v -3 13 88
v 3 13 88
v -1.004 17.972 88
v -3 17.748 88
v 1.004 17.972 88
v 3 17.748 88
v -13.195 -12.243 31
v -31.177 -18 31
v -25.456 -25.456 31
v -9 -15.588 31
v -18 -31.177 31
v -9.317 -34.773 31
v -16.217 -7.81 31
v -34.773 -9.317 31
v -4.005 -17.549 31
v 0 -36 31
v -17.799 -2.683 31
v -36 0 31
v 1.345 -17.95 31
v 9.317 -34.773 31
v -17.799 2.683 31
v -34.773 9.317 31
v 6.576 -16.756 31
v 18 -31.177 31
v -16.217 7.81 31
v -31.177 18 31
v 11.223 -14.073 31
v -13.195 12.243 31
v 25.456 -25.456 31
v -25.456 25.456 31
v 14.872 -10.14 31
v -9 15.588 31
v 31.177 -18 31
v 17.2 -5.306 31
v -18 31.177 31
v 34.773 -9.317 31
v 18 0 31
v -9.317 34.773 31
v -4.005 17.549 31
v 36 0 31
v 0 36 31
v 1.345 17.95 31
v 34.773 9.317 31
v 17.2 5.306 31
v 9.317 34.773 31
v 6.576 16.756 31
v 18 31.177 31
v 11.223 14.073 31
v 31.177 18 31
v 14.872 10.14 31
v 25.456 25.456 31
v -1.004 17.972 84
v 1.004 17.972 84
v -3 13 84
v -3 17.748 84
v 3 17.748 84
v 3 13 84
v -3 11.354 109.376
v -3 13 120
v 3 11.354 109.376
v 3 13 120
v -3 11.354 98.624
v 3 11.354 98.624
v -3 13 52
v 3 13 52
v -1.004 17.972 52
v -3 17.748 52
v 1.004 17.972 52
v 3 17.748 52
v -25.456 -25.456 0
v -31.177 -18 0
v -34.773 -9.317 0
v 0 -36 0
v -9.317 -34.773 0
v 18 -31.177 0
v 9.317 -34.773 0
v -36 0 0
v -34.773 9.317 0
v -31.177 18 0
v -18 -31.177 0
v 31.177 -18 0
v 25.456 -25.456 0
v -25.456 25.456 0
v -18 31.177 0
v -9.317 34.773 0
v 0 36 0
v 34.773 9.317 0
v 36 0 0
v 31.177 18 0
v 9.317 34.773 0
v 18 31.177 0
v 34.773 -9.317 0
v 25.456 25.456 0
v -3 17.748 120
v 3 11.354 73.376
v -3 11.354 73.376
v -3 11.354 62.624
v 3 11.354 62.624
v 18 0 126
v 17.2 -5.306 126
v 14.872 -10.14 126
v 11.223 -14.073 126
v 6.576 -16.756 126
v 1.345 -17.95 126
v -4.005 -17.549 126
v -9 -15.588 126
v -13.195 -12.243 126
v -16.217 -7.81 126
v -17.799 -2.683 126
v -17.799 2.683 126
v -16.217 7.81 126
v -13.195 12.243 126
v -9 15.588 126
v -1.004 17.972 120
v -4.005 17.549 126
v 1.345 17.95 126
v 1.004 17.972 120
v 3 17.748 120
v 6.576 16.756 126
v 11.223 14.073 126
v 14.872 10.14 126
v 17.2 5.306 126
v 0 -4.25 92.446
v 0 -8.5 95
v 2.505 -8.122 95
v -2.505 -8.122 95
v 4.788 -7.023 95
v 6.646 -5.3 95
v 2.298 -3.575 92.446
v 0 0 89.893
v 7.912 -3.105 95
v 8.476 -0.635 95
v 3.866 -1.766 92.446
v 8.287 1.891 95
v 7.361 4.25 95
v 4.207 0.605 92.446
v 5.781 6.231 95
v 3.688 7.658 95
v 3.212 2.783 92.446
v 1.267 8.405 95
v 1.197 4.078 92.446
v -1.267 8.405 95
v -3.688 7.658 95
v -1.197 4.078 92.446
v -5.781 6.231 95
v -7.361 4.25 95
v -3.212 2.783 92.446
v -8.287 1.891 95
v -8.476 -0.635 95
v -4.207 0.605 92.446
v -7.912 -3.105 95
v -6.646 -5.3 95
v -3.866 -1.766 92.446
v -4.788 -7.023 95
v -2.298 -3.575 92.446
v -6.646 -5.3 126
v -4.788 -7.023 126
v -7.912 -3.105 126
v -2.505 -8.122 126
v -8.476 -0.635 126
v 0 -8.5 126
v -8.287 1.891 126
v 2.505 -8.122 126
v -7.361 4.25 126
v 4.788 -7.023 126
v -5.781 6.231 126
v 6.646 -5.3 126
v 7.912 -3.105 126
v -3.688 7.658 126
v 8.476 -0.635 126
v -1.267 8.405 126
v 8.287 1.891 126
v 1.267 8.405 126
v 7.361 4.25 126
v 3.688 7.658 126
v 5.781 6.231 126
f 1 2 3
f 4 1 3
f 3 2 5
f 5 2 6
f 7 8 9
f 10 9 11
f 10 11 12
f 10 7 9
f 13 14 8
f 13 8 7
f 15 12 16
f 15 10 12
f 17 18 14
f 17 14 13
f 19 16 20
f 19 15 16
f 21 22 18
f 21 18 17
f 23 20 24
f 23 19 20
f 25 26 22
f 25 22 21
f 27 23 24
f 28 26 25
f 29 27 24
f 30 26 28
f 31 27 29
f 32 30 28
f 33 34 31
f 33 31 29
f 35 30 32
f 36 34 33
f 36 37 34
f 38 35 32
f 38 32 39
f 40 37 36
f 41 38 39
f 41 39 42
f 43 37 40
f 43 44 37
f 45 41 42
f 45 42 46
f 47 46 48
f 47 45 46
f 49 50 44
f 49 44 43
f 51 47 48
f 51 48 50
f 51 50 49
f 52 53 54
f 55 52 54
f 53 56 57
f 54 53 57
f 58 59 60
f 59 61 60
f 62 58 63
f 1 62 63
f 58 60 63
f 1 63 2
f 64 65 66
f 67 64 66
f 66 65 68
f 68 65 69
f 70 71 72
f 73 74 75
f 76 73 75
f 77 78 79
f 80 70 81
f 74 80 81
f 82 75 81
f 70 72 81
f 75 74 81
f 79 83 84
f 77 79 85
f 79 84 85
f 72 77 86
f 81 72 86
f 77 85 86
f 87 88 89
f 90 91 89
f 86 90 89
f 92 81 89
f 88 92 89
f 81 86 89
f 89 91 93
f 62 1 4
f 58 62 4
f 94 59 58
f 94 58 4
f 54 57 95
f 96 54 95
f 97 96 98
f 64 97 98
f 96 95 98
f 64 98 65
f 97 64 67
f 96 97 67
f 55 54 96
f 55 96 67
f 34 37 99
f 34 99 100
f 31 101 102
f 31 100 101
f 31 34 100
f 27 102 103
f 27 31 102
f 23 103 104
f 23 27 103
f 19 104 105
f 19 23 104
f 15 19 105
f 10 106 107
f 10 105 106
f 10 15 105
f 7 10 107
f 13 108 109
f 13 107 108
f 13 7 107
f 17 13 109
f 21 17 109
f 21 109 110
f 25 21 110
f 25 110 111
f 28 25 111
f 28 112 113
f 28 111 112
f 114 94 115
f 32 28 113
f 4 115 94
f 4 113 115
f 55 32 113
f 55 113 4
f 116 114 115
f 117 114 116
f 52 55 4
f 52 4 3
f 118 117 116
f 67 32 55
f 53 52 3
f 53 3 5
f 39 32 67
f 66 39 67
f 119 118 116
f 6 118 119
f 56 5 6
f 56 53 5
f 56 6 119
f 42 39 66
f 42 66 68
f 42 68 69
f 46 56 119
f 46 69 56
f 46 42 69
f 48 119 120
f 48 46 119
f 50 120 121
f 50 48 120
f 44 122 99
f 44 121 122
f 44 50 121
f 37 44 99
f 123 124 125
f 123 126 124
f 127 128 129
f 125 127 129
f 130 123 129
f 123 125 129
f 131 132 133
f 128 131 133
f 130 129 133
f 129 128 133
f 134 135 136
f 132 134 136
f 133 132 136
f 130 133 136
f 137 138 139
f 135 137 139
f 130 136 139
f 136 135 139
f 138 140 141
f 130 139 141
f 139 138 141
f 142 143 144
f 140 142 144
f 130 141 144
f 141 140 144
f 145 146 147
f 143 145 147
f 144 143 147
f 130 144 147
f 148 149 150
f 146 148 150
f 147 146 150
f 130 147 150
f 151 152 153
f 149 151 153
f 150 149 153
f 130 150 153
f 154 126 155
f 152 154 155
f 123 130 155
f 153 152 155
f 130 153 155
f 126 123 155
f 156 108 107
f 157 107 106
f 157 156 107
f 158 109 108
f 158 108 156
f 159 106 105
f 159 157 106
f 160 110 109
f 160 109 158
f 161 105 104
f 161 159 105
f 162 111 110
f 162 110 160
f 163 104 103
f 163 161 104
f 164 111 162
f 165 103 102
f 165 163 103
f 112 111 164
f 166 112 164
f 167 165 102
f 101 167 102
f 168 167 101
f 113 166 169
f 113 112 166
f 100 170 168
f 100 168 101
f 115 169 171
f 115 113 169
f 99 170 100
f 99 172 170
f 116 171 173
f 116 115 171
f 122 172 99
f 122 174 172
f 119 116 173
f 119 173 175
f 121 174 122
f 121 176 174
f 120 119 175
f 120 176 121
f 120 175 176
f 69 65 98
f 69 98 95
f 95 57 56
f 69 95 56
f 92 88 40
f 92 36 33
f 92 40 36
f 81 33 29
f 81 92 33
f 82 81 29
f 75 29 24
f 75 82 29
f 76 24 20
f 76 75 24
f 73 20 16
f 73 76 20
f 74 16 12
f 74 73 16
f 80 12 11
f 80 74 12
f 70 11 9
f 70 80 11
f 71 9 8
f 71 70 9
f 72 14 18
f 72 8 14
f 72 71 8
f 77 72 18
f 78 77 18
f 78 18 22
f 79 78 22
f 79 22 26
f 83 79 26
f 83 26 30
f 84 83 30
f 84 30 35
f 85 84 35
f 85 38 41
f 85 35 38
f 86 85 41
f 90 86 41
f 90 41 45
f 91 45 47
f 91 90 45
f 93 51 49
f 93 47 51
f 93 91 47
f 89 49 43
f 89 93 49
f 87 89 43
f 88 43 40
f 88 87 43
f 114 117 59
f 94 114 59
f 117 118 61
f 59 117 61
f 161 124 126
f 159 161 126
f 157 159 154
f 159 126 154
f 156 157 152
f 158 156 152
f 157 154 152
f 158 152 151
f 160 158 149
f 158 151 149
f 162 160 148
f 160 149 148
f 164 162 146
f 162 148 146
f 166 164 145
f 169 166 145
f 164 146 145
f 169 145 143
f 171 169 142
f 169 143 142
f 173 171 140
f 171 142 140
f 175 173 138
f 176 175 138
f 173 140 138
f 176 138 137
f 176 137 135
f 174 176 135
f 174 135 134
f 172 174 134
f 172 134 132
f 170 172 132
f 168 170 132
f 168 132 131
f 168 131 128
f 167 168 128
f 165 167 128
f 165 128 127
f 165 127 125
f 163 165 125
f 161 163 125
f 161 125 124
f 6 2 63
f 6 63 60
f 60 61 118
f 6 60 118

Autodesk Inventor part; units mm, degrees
ref_plane "YZ Plane" through (0, 0, 0) normal (1, 0, 0) x (0, 1, 0)
ref_plane "XZ Plane" through (0, 0, 0) normal (0, 1, 0) x (-1, 0, 0)
ref_plane "XY Plane" through (0, 0, 0) normal (0, 0, 1) x (1, 0, 0)
sketch "Эскиз1" plane through (0, 0, 0) normal (0, 0, 1) x (1, 0, 0)
  circle A0 centre (0, 0) radius 36
  dimension "d0" = 72
extrude "Выдавливание1" add sketch "Эскиз1" along normal blind 31
sketch "Эскиз2" plane through (0, 0, 31) normal (0, 0, 1) x (1, 0, 0)
  circle A0 centre (0, 0) radius 18
  dimension "d3" = 36
extrude "Выдавливание2" add sketch "Эскиз2" along normal blind 95
sketch "Эскиз3" plane through (0, 0, 126) normal (0, 0, 1) x (1, 0, 0)
  point P0 (0, -47.75)
  point P1 (0, 0)
hole "Отверстие1" at (0, 0, 126) direction (0, 0, -1) diameter 17 depth 31 tip angle 118
sketch "Эскиз4" plane through (0, 0, 0) normal (1, 0, 0) x (0, 1, 0)
  line L0 (18, 31) -> (18, 126) projected
  line L1 (18, 120) -> (18, 88)
  line L2 (18, 126) -> (-18, 126) projected
  line L3 (18, 120) -> (13, 120)
  line L4 (13, 120) -> (13, 88)
  line L5 (13, 88) -> (18, 88)
  arc A0 (13, 120) -> (13, 88) centre (81.1469, 104) ccw
  line L6 (18, 84) -> (18, 52)
  line L7 (18, 84) -> (13, 84)
  line L8 (13, 84) -> (13, 52)
  line L9 (13, 52) -> (18, 52)
  arc A1 (13, 84) -> (13, 52) centre (81.1469, 68) ccw
  point P0 (0, 0)
  point P1 (19, 127)
  dimension "d13" = 6
  dimension "d14" = 32
  dimension "d15" = 5
  dimension "d16" = 70
  dimension "d17" = 32
  dimension "d18" = 5
  dimension "d19" = 70
  dimension "d20" = 4
extrude "Выдавливание3" cut sketch "Эскиз4" against normal mid plane 6
properties part number "Носок" material "Сталь, высокопрочная, низколегированная"
